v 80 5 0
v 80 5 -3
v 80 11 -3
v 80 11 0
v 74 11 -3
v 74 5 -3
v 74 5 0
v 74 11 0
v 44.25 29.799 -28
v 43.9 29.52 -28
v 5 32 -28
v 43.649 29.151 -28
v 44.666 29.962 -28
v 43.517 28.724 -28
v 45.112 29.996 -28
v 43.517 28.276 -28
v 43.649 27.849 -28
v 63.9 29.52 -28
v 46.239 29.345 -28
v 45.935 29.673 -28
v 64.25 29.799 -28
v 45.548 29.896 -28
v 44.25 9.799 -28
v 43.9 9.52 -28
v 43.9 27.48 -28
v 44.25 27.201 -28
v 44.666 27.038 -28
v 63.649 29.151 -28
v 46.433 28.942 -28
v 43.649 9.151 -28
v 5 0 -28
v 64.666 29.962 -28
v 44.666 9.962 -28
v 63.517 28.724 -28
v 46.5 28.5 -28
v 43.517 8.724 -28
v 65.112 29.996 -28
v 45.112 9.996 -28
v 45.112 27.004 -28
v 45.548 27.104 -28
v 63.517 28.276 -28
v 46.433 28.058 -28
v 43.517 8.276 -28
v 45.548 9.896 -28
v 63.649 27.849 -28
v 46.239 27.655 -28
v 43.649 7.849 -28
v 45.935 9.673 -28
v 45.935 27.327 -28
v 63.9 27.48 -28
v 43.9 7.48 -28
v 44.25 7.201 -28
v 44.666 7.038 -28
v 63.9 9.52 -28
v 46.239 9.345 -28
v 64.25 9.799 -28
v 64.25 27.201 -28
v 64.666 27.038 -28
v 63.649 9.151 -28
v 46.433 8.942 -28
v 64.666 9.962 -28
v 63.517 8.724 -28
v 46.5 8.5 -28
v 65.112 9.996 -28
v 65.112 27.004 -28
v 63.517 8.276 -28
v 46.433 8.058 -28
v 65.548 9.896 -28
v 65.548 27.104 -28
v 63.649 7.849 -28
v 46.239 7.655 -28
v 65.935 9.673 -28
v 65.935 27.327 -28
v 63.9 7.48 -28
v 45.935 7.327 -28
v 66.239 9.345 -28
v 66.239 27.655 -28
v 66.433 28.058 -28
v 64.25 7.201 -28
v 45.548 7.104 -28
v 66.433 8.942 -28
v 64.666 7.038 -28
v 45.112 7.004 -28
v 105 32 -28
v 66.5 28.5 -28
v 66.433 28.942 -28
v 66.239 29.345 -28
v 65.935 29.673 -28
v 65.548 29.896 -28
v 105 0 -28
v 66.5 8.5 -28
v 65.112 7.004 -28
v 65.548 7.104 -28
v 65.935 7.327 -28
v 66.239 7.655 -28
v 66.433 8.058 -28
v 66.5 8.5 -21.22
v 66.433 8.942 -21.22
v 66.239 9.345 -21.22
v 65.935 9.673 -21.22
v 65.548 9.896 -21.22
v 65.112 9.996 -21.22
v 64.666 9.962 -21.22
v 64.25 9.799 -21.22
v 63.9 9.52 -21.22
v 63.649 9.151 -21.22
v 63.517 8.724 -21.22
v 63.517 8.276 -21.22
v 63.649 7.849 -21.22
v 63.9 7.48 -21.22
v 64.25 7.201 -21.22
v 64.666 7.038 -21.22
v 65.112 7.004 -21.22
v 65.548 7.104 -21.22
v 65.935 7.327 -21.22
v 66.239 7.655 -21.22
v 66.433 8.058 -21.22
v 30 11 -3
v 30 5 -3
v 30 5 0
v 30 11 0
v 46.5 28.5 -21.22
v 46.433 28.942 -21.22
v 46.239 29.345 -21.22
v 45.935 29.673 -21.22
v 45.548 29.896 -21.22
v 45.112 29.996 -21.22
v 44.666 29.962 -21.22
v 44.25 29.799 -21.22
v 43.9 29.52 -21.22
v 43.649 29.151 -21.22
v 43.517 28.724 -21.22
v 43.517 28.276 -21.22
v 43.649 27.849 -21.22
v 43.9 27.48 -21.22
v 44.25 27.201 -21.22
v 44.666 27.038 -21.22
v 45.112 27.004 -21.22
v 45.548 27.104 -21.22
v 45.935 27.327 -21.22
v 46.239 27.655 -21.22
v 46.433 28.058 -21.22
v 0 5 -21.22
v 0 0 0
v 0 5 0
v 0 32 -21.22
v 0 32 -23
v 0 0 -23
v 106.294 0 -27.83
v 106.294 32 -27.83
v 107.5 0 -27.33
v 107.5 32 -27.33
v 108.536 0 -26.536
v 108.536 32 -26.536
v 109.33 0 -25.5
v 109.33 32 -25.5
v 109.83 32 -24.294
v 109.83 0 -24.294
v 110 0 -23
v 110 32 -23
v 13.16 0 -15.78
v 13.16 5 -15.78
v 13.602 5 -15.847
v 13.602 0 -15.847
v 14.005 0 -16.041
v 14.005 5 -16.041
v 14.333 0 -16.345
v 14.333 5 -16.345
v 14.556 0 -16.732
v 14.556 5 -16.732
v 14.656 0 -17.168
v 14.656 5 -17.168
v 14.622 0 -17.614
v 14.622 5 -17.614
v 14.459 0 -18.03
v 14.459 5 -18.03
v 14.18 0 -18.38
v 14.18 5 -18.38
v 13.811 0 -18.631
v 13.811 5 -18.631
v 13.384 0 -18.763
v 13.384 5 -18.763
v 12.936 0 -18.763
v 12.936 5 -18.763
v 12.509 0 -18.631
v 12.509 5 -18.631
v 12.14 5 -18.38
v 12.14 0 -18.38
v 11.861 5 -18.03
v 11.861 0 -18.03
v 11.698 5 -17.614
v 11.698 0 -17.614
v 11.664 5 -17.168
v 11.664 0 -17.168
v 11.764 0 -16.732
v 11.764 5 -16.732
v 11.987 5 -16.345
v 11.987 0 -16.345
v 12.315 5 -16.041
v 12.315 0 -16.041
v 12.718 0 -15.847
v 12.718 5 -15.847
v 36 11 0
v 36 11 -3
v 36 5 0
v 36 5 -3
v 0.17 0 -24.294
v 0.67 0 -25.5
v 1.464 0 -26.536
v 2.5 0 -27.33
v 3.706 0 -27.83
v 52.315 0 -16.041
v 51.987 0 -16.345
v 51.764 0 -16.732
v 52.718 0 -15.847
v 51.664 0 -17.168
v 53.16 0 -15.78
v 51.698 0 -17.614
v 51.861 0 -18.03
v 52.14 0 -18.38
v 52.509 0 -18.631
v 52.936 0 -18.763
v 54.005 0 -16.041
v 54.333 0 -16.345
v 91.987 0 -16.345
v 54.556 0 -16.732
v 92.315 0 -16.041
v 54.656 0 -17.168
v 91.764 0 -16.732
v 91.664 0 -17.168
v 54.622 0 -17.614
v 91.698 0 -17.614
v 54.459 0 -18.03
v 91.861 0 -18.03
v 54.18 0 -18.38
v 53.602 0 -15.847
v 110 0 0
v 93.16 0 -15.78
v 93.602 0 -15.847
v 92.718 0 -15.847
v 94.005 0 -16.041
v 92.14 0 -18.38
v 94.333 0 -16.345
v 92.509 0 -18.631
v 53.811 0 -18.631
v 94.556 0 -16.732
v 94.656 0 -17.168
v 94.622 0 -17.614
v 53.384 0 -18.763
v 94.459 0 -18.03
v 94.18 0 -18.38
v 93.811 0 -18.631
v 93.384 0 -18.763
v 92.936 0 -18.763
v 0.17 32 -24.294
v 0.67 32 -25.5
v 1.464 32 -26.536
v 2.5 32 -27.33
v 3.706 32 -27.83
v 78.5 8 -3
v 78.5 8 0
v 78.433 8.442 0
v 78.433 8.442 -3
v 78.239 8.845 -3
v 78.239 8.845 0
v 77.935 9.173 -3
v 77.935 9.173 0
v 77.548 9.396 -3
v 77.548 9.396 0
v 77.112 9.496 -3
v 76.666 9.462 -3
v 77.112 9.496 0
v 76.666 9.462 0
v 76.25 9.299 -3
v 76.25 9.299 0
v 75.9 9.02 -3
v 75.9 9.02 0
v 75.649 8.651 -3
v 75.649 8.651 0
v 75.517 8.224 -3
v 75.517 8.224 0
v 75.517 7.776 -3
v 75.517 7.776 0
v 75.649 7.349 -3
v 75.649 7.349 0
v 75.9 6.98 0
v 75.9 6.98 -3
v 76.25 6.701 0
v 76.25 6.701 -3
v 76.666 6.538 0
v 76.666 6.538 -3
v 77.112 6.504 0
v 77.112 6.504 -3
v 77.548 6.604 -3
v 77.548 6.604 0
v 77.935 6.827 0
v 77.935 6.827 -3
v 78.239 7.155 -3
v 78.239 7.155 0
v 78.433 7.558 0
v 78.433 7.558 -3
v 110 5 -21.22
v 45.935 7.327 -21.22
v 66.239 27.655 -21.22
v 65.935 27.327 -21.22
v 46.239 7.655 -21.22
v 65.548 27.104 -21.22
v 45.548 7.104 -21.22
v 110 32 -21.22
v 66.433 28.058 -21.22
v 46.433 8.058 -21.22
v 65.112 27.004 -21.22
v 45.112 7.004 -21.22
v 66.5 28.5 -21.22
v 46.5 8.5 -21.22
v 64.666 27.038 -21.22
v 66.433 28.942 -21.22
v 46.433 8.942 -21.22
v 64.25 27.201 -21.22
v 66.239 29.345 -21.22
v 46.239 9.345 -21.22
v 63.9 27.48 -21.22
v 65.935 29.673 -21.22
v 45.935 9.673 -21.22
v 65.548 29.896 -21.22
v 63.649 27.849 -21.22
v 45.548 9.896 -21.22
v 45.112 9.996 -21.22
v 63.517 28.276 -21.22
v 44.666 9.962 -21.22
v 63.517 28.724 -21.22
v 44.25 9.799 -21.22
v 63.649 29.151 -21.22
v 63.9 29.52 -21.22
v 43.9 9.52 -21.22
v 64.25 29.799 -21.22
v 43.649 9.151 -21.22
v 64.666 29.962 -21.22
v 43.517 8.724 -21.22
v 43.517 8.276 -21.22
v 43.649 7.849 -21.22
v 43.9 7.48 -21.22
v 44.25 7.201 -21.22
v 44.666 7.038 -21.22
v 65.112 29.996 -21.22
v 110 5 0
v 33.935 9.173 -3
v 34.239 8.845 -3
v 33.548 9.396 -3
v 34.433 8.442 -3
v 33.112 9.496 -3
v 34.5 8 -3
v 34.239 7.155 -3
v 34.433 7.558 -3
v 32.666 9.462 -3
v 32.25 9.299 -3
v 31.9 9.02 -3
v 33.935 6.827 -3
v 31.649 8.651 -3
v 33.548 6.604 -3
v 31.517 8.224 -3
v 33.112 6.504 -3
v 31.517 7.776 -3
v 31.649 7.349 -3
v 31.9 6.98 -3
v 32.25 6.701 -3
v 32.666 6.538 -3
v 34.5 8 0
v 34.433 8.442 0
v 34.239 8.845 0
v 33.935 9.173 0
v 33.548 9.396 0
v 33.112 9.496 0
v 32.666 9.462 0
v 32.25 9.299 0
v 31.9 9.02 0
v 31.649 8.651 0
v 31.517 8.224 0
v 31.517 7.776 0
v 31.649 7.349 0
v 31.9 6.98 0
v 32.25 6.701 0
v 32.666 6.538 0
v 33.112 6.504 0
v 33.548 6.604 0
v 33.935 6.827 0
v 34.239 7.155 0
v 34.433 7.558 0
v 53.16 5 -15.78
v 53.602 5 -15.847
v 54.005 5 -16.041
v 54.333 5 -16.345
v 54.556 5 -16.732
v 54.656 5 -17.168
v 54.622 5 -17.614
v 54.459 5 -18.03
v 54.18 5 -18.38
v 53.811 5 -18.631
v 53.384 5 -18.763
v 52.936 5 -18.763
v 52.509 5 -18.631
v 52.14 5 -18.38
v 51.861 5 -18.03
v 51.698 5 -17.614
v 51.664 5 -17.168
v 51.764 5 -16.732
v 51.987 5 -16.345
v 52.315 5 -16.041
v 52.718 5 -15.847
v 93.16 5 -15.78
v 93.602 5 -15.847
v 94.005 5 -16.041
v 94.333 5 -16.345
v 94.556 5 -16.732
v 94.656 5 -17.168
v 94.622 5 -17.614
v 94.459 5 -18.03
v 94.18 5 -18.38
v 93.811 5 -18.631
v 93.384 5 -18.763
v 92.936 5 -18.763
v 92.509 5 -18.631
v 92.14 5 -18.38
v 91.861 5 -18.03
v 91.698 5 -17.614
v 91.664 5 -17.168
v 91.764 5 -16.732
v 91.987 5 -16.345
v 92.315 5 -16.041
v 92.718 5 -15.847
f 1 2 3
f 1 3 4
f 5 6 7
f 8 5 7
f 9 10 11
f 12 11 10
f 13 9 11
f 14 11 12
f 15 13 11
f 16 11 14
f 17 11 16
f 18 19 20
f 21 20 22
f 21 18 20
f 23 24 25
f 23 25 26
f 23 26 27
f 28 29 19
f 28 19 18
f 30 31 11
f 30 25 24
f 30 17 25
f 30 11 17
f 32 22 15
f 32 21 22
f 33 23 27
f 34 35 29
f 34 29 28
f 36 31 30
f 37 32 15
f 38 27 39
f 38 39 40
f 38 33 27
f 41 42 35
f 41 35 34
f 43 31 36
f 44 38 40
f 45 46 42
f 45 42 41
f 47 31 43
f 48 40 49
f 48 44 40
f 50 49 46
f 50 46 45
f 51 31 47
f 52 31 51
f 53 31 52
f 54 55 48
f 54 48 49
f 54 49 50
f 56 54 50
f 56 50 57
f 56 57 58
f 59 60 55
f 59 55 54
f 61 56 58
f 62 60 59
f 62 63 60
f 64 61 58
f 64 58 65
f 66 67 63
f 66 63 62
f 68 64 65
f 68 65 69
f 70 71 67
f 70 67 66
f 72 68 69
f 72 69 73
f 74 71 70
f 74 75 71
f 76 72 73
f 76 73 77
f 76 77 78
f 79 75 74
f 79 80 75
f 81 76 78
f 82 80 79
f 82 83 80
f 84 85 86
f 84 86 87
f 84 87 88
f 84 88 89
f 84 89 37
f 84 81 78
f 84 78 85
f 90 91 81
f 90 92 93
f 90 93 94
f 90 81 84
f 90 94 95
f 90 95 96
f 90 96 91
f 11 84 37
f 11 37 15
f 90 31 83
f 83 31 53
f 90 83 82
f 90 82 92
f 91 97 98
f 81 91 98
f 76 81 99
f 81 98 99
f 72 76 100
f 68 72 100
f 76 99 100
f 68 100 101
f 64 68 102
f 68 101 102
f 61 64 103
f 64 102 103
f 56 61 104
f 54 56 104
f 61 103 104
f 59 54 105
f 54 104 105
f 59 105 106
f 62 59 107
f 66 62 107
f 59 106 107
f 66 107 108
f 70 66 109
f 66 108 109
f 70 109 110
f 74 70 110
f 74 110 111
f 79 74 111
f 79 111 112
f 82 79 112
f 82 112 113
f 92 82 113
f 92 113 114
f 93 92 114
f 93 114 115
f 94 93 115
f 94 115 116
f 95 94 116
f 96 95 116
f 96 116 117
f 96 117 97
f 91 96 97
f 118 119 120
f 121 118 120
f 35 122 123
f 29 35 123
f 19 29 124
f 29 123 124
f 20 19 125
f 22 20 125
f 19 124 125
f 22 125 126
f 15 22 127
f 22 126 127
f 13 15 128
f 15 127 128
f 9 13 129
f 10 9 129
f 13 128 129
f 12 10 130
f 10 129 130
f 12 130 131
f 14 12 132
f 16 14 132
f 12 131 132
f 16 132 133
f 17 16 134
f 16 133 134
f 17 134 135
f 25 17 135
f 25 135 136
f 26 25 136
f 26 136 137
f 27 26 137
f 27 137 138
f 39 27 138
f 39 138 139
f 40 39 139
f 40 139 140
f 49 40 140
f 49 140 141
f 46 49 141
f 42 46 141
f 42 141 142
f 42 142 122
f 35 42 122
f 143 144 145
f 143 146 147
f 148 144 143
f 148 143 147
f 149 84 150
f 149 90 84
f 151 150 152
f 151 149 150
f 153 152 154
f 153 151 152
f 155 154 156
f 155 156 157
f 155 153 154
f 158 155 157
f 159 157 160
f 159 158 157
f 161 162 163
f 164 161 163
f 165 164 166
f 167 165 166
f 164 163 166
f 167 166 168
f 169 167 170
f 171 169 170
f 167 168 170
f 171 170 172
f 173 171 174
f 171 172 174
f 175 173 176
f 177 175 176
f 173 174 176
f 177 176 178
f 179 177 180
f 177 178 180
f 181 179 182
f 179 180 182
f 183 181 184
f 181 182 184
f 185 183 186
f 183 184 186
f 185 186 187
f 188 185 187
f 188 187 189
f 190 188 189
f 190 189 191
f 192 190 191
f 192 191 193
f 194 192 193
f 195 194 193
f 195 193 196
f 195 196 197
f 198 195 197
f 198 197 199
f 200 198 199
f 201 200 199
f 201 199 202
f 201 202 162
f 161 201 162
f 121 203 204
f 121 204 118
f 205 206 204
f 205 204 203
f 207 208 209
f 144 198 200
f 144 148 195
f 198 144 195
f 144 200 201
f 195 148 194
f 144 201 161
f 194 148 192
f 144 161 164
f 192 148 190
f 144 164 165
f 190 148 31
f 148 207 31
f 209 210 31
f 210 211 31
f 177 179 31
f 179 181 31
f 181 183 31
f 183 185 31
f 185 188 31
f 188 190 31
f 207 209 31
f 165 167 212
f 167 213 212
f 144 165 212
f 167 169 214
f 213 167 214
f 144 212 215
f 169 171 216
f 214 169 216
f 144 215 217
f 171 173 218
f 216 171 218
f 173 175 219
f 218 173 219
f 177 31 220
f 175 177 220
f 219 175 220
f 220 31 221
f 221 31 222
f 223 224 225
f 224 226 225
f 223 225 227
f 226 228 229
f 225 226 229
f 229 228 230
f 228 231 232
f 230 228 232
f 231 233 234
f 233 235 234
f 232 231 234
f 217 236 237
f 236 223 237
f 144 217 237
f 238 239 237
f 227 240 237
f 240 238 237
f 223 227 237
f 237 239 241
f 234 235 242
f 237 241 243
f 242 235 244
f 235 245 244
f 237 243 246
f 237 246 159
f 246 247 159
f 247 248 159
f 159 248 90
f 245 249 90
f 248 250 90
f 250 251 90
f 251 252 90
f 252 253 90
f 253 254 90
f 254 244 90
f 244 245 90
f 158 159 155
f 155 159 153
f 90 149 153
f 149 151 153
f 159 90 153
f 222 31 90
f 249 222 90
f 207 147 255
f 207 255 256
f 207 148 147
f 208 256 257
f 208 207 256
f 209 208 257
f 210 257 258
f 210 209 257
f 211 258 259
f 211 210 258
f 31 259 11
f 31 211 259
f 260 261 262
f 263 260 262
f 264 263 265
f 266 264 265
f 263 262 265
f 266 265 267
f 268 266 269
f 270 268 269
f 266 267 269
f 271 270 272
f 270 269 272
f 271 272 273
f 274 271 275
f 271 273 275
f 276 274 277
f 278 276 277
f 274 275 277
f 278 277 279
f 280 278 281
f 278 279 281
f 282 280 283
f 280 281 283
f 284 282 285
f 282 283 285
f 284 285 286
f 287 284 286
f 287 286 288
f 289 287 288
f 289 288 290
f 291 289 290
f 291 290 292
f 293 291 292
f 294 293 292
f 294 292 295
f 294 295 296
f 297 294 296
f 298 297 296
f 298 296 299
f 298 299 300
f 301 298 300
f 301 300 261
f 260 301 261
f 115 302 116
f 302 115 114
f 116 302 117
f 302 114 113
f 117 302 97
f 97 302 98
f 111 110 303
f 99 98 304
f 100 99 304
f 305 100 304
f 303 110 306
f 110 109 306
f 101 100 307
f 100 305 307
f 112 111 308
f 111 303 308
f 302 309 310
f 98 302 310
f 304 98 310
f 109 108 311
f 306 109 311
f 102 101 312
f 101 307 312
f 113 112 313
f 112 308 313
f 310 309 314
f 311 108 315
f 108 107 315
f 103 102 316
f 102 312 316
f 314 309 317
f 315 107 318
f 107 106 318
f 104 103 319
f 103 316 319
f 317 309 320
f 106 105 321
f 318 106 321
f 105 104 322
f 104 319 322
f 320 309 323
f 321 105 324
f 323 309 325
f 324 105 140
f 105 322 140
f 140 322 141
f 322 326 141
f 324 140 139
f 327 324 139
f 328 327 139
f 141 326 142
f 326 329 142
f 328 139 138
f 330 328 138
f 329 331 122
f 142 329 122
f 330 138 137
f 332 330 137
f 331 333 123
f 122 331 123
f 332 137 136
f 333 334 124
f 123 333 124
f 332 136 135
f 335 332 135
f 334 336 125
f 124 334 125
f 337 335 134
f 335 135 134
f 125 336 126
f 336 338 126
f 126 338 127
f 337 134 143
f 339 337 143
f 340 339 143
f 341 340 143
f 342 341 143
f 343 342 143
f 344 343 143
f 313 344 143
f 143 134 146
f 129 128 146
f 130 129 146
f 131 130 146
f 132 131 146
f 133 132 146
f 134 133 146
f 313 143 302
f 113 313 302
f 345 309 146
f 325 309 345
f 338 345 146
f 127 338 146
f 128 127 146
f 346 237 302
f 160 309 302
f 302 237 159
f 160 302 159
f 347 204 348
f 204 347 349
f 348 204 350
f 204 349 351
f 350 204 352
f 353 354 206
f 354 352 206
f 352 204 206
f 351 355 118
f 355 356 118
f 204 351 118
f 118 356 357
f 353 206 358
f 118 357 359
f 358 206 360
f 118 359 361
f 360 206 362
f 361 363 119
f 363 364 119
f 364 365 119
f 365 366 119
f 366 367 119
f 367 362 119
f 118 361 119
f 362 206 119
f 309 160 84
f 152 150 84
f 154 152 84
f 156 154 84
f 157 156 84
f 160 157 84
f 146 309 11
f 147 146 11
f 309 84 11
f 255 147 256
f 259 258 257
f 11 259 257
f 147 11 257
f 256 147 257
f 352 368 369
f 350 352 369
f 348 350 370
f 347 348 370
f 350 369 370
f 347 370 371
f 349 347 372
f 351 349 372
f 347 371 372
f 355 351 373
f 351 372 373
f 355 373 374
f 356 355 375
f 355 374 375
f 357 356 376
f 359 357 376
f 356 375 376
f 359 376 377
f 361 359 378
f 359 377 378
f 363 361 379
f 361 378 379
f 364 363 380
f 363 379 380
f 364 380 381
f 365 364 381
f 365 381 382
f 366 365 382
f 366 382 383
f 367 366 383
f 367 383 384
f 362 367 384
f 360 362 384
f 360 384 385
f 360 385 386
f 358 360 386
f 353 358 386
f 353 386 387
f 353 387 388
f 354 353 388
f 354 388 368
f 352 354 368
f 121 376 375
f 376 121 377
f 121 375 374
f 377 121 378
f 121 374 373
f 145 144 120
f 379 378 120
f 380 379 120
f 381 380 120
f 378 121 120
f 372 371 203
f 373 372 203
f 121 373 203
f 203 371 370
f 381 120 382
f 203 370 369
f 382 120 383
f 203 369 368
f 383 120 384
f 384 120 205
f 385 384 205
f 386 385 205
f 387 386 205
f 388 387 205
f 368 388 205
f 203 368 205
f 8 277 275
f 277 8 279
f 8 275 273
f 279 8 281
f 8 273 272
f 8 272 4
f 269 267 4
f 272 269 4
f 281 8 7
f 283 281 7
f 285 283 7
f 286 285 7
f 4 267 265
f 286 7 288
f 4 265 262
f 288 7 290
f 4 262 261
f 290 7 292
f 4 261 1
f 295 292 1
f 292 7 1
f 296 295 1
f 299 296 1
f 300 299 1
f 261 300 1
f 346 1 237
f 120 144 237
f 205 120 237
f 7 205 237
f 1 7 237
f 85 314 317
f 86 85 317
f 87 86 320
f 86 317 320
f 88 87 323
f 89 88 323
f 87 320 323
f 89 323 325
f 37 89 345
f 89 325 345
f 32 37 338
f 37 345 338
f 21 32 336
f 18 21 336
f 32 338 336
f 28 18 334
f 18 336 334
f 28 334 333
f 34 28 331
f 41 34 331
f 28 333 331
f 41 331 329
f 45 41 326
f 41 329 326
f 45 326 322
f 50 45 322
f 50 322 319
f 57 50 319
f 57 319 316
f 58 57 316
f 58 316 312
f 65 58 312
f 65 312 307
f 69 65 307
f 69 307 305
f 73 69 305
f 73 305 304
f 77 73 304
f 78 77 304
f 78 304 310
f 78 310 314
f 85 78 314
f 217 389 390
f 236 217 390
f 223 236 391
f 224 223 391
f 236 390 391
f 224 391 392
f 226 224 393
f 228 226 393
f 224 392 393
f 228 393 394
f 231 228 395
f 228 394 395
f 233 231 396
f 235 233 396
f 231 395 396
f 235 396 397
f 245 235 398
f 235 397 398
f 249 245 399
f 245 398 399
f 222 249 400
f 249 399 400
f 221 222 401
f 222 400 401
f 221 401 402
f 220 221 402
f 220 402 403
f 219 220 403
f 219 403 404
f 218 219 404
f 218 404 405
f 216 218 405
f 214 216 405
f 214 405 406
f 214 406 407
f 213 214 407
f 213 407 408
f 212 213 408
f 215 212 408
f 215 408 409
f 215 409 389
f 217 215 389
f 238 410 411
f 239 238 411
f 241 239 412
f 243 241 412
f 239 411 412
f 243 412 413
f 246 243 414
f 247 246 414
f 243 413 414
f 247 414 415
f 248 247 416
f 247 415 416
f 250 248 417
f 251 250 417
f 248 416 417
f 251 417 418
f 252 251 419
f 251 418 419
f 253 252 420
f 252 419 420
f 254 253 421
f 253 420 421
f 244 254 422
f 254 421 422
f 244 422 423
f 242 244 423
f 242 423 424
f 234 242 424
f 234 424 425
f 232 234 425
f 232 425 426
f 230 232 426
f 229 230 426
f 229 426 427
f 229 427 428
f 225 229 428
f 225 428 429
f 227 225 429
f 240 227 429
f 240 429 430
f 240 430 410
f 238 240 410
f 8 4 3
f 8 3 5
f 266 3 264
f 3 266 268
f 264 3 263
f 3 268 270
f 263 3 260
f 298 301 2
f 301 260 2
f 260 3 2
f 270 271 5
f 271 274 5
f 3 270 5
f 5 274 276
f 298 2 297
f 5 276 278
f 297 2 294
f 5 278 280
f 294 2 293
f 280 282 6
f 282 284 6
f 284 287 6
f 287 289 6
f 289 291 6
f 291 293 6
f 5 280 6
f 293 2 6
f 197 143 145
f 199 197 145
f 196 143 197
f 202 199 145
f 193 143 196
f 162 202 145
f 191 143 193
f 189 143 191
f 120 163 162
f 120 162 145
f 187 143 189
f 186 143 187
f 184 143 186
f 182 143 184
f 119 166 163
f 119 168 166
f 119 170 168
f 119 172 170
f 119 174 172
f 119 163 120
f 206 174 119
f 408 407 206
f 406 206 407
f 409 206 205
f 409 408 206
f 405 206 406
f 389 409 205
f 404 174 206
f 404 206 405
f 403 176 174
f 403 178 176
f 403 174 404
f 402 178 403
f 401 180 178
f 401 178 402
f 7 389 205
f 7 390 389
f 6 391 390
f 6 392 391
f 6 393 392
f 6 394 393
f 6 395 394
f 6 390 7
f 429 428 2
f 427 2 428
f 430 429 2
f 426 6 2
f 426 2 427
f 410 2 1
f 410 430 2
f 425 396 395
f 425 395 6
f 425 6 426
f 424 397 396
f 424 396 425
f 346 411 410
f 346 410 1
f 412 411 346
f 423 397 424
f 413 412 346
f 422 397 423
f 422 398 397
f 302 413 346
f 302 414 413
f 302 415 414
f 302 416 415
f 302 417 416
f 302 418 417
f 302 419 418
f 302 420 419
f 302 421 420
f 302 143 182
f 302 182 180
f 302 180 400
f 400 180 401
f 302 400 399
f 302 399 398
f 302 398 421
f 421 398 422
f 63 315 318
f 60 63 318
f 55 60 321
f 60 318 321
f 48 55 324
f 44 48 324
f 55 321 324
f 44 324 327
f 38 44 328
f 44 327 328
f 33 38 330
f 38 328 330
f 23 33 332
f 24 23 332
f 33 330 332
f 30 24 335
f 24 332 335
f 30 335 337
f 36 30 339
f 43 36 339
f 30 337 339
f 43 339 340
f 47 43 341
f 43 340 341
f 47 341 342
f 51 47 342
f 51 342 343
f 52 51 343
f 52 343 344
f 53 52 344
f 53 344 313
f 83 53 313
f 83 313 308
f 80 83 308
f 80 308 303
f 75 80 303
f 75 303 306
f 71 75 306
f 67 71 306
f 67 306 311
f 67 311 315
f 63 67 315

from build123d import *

# Parameters (mm, degrees)
SKETCH1_W           = 110
SKETCH1_H           = 28
BOSS_EXTRUDE1_DEPTH = 5
SKETCH2_W           = 110
SKETCH2_H           = 32
BOSS_EXTRUDE2_DEPTH = 6.78
SKETCH3_R           = 1.5
CUT_EXTRUDE1_DEPTH  = 117.674761624
SKETCH4_R           = 1.5
CUT_EXTRUDE2_DEPTH  = 117.508748169
FILLET1_R           = 5
SKETCH5_W           = 6
SKETCH5_H           = 3
BOSS_EXTRUDE3_DEPTH = 6
SKETCH6_R           = 1.5
CUT_EXTRUDE3_DEPTH  = 6


with BuildPart() as part:
    # Sketch1 → Boss-Extrude1 (new body)
    with BuildSketch(Plane(origin=(0, 0, 0), x_dir=(1, 0, 0), z_dir=(0, 1, 0))):
        with Locations((55, 14)):
            Rectangle(SKETCH1_W, SKETCH1_H)
    extrude(amount=BOSS_EXTRUDE1_DEPTH)

    # Sketch2 → Boss-Extrude2 (add)
    with BuildSketch(Plane(origin=(0, 0, -28), x_dir=(-1, 0, 0), z_dir=(0, 0, -1))):
        with Locations((-55, 16)):
            Rectangle(SKETCH2_W, SKETCH2_H)
    extrude(amount=-BOSS_EXTRUDE2_DEPTH)

    # Sketch3 → Cut-Extrude1 (cut, through all)
    with BuildSketch(Plane(origin=(0, 5, 0), x_dir=(-1, 0, 0), z_dir=(0, 1, 0))):
        with Locations(Location((-13.16, -17.28, 0), (0, 0, 90))):
            Circle(SKETCH3_R)
        with Locations(Location((-53.16, -17.28, 0), (0, 0, 90))):
            Circle(SKETCH3_R)
        with Locations(Location((-93.16, -17.28, 0), (0, 0, 90))):
            Circle(SKETCH3_R)
    extrude(amount=-CUT_EXTRUDE1_DEPTH, mode=Mode.SUBTRACT)

    # Sketch4 → Cut-Extrude2 (cut, through all)
    with BuildSketch(Plane.XY.offset(-21.22)):
        with Locations((45, 8.5)):
            Circle(SKETCH4_R)
        with Locations((65, 8.5)):
            Circle(SKETCH4_R)
        with Locations((45, 28.5)):
            Circle(SKETCH4_R)
        with Locations((65, 28.5)):
            Circle(SKETCH4_R)
    extrude(amount=-CUT_EXTRUDE2_DEPTH, mode=Mode.SUBTRACT)

    # Fillet1
    fillet1_edges = [part.edges().sort_by_distance(p)[0] for p in [
        (0, 16, -28),
        (110, 16, -28),
    ]]
    fillet(fillet1_edges, radius=FILLET1_R)

    # Sketch5 → Boss-Extrude3 (add)
    with BuildSketch(Plane(origin=(0, 5, 0), x_dir=(-1, 0, 0), z_dir=(0, 1, 0))):
        with Locations((-33, -1.5)):
            Rectangle(SKETCH5_W, SKETCH5_H)
        with Locations((-77, -1.5)):
            Rectangle(SKETCH5_W, SKETCH5_H)
    extrude(amount=BOSS_EXTRUDE3_DEPTH)

    # Sketch6 → Cut-Extrude3 (cut)
    with BuildSketch(Plane.XY):
        with Locations((33, 8)):
            Circle(SKETCH6_R)
        with Locations((77, 8)):
            Circle(SKETCH6_R)
    extrude(amount=-CUT_EXTRUDE3_DEPTH, mode=Mode.SUBTRACT)


solid = part.part
